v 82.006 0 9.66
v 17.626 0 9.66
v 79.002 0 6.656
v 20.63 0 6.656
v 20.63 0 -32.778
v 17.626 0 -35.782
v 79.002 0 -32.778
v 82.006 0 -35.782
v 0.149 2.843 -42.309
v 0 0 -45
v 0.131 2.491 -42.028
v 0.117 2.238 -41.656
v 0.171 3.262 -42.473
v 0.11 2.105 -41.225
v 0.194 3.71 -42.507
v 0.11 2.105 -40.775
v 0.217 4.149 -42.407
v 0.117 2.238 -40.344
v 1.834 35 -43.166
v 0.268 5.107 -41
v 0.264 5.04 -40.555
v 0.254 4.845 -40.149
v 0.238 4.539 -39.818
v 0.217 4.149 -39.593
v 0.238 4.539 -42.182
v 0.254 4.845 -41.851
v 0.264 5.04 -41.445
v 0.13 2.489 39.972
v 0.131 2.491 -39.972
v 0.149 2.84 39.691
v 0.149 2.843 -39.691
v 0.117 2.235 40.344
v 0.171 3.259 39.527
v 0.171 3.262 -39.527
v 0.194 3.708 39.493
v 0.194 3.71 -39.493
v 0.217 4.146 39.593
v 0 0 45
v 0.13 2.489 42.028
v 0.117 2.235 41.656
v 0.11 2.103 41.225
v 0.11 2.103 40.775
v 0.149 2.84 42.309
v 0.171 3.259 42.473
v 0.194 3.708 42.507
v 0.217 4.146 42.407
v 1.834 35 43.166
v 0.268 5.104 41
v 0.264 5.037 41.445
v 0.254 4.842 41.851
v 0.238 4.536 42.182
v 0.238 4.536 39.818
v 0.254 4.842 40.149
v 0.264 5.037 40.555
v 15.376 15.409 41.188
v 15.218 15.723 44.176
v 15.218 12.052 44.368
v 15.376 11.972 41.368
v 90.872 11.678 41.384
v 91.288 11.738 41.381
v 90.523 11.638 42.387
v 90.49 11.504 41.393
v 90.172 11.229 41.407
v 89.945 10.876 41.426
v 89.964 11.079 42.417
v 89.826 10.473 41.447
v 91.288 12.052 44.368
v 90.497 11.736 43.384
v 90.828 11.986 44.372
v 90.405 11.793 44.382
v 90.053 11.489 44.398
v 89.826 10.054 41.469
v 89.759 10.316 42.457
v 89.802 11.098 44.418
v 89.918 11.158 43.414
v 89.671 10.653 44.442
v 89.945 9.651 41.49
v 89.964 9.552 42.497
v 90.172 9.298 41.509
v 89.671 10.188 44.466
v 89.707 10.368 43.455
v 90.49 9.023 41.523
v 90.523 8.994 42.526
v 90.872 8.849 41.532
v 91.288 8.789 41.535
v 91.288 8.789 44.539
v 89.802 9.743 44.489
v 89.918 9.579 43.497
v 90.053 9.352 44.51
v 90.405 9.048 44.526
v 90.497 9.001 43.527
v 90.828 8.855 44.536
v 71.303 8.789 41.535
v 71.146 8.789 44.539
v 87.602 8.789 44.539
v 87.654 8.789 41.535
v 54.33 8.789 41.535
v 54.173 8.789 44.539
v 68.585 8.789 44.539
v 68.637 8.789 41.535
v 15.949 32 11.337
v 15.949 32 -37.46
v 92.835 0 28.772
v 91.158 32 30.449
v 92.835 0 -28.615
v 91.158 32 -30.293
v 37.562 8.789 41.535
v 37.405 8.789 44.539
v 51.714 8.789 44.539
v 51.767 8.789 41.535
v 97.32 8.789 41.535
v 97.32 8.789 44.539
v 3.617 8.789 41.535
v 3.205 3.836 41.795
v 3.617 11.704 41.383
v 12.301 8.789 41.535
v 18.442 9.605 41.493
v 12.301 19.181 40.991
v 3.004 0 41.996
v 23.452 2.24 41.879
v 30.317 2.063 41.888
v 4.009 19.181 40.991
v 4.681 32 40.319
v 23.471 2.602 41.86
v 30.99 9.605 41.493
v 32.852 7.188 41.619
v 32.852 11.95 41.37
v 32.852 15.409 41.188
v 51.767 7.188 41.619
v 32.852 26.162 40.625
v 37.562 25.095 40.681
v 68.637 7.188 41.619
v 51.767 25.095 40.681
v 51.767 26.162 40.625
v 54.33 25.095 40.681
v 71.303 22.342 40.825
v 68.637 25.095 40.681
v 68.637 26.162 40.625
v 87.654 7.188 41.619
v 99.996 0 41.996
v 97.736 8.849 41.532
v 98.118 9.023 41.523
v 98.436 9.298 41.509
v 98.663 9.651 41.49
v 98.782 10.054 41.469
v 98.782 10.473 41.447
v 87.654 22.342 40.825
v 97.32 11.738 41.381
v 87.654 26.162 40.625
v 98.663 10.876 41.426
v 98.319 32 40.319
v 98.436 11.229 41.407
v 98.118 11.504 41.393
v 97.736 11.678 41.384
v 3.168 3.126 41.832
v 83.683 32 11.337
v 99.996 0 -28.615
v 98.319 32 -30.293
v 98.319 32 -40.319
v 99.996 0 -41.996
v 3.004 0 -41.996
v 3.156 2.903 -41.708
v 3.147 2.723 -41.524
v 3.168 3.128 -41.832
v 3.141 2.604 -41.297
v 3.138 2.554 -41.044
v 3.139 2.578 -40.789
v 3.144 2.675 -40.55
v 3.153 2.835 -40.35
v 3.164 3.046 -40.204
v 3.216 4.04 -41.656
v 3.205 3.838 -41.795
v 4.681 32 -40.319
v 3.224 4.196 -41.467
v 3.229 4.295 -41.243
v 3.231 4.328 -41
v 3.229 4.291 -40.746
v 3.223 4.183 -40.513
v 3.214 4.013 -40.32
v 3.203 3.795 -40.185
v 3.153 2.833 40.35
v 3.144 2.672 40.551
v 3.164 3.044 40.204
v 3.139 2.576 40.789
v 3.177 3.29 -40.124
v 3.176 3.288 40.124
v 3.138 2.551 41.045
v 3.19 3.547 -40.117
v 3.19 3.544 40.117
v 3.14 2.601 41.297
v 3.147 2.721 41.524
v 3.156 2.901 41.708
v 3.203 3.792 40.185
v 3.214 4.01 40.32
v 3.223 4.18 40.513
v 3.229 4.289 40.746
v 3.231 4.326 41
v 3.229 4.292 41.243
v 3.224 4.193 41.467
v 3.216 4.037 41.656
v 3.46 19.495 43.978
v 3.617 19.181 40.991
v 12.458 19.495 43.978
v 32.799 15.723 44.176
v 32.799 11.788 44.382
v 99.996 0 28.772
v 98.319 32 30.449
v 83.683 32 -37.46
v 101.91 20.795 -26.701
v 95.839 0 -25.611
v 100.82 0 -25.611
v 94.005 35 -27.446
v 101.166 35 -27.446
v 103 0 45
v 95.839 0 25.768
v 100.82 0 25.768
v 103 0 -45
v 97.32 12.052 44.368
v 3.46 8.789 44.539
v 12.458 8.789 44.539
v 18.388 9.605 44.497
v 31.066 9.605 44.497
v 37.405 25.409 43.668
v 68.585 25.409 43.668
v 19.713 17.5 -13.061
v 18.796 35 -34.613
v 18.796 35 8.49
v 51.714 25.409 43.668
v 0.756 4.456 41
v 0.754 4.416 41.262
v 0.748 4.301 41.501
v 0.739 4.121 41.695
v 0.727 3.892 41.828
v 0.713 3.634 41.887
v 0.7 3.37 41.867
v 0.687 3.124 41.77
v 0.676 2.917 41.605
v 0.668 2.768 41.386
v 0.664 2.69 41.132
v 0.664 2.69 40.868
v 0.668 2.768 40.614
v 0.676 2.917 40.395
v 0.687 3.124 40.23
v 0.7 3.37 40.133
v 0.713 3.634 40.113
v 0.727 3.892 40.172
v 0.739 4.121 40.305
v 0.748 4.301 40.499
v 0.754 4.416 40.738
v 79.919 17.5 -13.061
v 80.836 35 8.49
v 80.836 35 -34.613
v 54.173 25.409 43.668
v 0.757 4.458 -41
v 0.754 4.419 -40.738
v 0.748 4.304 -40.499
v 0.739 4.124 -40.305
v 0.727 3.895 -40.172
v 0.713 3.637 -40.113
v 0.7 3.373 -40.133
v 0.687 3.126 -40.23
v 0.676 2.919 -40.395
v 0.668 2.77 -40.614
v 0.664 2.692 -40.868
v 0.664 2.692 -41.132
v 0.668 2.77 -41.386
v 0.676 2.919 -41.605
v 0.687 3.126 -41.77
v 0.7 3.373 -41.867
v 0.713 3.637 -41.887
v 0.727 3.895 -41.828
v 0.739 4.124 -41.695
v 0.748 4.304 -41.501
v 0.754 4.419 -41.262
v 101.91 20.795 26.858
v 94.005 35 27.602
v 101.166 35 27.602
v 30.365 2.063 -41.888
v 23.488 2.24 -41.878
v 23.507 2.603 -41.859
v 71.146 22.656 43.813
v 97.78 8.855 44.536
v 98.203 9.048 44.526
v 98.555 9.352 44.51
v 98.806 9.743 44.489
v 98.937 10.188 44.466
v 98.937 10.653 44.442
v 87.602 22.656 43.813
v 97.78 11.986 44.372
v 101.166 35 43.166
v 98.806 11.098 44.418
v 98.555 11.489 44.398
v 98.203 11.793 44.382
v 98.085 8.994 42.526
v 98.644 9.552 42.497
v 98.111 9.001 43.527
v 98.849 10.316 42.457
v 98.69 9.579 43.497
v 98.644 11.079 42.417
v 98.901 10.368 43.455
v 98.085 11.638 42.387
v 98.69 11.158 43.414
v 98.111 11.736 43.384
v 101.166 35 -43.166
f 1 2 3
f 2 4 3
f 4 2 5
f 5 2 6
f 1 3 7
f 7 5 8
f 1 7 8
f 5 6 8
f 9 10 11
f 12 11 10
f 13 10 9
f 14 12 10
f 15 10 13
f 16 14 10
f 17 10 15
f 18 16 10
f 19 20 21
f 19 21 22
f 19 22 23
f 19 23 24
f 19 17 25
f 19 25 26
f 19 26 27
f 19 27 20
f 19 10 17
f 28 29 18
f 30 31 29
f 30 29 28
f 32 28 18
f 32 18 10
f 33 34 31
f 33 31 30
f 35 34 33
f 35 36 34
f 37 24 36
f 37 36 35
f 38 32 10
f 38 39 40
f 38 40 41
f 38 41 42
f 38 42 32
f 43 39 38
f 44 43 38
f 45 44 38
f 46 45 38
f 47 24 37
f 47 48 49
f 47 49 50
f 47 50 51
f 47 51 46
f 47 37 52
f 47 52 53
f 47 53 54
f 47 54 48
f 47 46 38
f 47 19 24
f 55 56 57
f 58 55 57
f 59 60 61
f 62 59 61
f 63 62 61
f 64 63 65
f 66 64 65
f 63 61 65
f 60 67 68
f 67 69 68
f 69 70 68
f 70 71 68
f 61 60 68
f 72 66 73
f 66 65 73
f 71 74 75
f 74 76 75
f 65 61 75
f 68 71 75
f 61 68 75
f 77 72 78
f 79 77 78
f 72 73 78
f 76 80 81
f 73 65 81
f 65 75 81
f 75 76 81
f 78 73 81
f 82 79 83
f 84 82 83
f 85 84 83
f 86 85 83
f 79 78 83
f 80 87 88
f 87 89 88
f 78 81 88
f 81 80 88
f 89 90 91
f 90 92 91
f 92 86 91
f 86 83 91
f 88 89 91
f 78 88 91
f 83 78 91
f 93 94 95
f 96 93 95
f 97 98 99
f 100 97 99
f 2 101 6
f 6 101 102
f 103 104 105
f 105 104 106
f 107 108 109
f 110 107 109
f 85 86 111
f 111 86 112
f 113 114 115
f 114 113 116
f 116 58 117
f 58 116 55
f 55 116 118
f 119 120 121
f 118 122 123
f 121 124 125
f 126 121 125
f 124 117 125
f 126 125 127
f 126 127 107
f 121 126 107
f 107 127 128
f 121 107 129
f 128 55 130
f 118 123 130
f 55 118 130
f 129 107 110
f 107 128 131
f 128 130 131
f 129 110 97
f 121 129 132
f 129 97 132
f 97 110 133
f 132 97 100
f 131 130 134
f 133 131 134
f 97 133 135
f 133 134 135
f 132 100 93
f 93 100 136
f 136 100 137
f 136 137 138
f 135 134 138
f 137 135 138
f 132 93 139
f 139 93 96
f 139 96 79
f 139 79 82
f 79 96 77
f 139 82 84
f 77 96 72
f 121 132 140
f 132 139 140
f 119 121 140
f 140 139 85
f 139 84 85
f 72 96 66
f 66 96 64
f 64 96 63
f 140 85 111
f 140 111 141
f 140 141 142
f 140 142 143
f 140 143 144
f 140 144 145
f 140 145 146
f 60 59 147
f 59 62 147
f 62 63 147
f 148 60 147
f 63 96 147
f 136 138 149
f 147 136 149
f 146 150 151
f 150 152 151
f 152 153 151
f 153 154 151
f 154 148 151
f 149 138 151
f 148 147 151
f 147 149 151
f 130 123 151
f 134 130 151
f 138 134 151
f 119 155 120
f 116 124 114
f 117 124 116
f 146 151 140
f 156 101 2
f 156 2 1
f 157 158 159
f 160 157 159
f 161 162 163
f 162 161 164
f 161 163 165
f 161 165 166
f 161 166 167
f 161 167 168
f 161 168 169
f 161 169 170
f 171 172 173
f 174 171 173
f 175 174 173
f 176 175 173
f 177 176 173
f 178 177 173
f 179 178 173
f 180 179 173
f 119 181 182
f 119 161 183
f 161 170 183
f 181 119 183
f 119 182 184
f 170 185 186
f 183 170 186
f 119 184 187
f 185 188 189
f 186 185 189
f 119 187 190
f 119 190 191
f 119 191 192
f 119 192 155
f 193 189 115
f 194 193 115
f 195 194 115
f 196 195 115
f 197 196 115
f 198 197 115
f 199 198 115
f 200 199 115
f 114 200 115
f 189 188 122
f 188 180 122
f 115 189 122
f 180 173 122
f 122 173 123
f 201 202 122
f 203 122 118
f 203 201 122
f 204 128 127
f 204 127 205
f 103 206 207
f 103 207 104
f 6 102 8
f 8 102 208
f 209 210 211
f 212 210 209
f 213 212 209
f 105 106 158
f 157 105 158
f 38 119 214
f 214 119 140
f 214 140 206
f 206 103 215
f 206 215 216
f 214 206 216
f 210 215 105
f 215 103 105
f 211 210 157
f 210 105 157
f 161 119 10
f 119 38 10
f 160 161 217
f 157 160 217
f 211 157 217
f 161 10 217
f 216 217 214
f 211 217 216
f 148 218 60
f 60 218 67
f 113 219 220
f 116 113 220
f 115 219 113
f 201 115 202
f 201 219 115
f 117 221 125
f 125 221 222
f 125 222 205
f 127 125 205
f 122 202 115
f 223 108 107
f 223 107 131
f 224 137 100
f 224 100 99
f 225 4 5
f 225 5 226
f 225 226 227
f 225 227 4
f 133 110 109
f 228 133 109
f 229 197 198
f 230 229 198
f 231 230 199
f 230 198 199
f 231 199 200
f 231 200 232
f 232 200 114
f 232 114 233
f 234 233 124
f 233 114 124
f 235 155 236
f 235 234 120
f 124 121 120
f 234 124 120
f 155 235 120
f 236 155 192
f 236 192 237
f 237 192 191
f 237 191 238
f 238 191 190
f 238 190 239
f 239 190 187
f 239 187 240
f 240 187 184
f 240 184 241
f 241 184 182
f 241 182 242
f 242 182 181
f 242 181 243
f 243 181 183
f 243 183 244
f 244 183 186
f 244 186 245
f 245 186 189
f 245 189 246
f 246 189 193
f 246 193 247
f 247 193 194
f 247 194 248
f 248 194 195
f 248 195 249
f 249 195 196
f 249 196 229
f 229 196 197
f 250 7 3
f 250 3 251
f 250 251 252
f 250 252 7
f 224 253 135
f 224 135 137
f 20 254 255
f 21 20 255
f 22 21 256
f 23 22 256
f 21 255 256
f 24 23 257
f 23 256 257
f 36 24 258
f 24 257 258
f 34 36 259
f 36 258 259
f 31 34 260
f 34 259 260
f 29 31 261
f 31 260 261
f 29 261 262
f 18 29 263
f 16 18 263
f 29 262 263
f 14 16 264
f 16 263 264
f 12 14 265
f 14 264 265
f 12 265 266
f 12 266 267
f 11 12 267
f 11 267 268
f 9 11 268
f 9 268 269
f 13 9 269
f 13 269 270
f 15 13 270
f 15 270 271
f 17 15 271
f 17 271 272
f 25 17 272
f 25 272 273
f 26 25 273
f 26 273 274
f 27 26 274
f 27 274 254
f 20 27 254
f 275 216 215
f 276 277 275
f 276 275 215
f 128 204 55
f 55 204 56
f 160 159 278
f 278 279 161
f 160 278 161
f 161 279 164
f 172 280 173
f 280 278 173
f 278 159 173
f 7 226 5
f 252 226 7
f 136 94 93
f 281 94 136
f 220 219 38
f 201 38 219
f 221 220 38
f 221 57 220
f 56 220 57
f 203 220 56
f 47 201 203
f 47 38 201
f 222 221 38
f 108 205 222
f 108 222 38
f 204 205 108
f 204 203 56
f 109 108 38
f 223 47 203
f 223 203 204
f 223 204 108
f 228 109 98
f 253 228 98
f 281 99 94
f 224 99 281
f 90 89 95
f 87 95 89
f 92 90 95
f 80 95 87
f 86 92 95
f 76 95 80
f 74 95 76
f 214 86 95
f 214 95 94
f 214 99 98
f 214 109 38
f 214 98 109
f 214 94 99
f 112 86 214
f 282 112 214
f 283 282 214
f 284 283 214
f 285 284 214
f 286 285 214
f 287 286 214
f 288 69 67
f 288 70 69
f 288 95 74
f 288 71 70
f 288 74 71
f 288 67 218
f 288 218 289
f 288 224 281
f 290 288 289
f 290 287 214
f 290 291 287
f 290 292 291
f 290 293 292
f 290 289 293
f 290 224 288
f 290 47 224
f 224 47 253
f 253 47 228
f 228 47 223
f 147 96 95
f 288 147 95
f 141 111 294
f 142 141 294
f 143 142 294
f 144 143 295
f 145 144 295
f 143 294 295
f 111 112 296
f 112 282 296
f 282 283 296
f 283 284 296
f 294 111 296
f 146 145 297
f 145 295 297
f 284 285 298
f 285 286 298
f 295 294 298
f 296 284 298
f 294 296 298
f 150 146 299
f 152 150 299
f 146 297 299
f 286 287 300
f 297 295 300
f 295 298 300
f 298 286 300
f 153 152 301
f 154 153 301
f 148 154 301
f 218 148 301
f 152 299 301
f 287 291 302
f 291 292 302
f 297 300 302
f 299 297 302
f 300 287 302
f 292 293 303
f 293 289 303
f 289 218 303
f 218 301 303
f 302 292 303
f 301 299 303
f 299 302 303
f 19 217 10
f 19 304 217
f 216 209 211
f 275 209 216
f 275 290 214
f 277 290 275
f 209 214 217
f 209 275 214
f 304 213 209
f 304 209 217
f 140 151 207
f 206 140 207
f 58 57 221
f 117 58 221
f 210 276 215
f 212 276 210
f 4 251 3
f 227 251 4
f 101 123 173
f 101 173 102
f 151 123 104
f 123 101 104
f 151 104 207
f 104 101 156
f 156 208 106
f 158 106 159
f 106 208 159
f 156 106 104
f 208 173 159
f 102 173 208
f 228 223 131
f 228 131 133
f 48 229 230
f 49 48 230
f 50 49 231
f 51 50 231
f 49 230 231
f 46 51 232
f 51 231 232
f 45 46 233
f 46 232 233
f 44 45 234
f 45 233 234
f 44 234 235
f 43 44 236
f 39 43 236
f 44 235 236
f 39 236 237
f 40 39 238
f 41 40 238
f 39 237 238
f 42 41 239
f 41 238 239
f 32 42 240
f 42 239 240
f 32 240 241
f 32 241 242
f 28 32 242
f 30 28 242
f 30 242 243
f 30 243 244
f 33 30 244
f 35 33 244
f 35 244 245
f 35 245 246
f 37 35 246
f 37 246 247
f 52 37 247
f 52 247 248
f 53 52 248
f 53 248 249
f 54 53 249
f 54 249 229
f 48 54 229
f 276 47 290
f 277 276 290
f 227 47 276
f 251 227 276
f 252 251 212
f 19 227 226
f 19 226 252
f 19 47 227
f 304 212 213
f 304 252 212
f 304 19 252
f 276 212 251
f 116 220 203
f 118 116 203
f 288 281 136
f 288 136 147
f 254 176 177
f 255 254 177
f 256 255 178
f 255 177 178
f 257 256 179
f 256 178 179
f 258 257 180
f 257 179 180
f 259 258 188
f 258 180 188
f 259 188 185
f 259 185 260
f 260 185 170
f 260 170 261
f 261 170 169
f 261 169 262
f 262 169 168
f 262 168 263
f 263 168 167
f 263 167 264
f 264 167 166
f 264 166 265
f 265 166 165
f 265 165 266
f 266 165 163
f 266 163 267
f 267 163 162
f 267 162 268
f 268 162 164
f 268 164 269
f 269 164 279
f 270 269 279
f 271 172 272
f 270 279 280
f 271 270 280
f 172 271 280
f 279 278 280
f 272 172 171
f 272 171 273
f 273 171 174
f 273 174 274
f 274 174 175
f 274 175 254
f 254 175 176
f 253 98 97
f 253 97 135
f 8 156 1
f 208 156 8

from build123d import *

# Parameters (mm, degrees)
SKETCH2_W                                         = 103
SKETCH2_H                                         = 90
SKETCH2_W_2                                       = 4.981131341
SKETCH2_H_2                                       = 51.379447355
SKETCH2_W_3                                       = 58.371562284
SKETCH2_H_3                                       = 39.434223375
BOSS_EXTRUDE2_DEPTH                               = 35
BOSS_EXTRUDE2_TAPER                               = 3
SHELL2_OUTLINE_W                                  = 67.733894234
SHELL2_OUTLINE_H                                  = 48.796555325
SHELL2_DEPTH                                      = 32
SHELL2_DRAFT                                      = 3
SKETCH11_W                                        = 8.997468353
SKETCH11_H                                        = 10.72090286
CUT_EXTRUDE2_DEPTH                                = 3
CUT_EXTRUDE2_DRAFT                                = -3
SKETCH11_W_2                                      = 14.518642115
SKETCH11_H_2                                      = 16.642925392
CUT_EXTRUDE2_PROFILE_2_DEPTH                      = 3
CUT_EXTRUDE2_PROFILE_2_DRAFT                      = -3
SKETCH11_W_3                                      = 14.620886073
CUT_EXTRUDE2_PROFILE_3_DEPTH                      = 3
CUT_EXTRUDE2_PROFILE_3_DRAFT                      = -3
SKETCH11_W_4                                      = 16.665765244
SKETCH11_H_3                                      = 13.8861218
CUT_EXTRUDE2_PROFILE_4_DEPTH                      = 3
CUT_EXTRUDE2_PROFILE_4_DRAFT                      = -3
CUT_EXTRUDE2_PROFILE_5_DEPTH                      = 3
CUT_EXTRUDE2_PROFILE_5_DRAFT                      = -3
CUT_EXTRUDE2_PROFILE_6_DEPTH                      = 3
CUT_EXTRUDE2_PROFILE_6_DRAFT                      = -3
CSK_FOR_0_FLAT_HEAD_MACHINE_SCREW_100_D           = 1.778
CSK_FOR_0_FLAT_HEAD_MACHINE_SCREW_100_CSINK_D     = 3.0226
CSK_FOR_0_FLAT_HEAD_MACHINE_SCREW_100_CSINK_ANGLE = 100
CSK_FOR_0_FLAT_HEAD_MACHINE_SCREW_2_D             = 1.778
CSK_FOR_0_FLAT_HEAD_MACHINE_SCREW_2_CSINK_D       = 3.0226
CSK_FOR_0_FLAT_HEAD_MACHINE_SCREW_2_CSINK_ANGLE   = 100
DRAFT4_START                                      = 5
DRAFT4_DEPTH                                      = 19


with BuildPart() as part:
    # Sketch2 → Boss-Extrude2 (new body)
    with BuildSketch(Plane(origin=(0, 0, 0), x_dir=(1, 0, 0), z_dir=(0, 1, 0))):
        with Locations((51.5, 0)):
            Rectangle(SKETCH2_W, SKETCH2_H)
        with Locations((98.329809834, -0.07834477)):
            Rectangle(SKETCH2_W_2, SKETCH2_H_2, mode=Mode.SUBTRACT)
        with Locations((49.815754183, 13.061230018)):
            Rectangle(SKETCH2_W_3, SKETCH2_H_3, mode=Mode.SUBTRACT)
    extrude(amount=BOSS_EXTRUDE2_DEPTH, taper=BOSS_EXTRUDE2_TAPER)


with BuildPart() as shell2_tool:
    # Shell2: read off the stored shape, not the designer's step
    # Shell2 outline → Shell2 (with draft: the straight prism first)
    with BuildSketch(Plane(origin=(0, 32, 0), x_dir=(1, 0, 0), z_dir=(0, 1, 0))):
        Polygon((98.318834025, -30.449234423), (91.158078188, -30.449234423), (91.158078188, 30.292544882), (98.318834025, 30.292544882), (98.318834025, 40.318834025), (4.681165975, 40.318834025), (4.681165975, -40.318834025), (98.318834025, -40.318834025), align=None)
        with Locations((49.815754183, 13.061230019)):
            Rectangle(SHELL2_OUTLINE_W, SHELL2_OUTLINE_H, mode=Mode.SUBTRACT)
    extrude(amount=-SHELL2_DEPTH)
    # Shell2: the draft: its side faces are tilted about the plane it starts from
    shell2_sides = [shell2_tool.faces().sort_by_distance(p)[0] for p in [
        (94.738456106, 16, 30.449234423),
        (91.158078188, 16, 0.07834477),
        (94.738456107, 16, -30.292544882),
        (98.318834025, 16, -35.305689454),
        (51.5, 16, -40.318834025),
        (4.681165975, 16, 0),
        (51.5, 16, 40.318834025),
        (98.318834025, 16, 35.384034224),
        (15.948807066, 16, -13.061230018),
        (49.815754183, 16, -37.459507681),
        (83.6827013, 16, -13.061230018),
        (49.815754183, 16, 11.337047644),
    ]]
    draft(shell2_sides, Plane(origin=(0, 32, 0), x_dir=(1, 0, 0), z_dir=(0, 1, 0)), SHELL2_DRAFT)


with BuildPart() as part_1:
    add(part.part)

    # Shell2: cut by shell2_tool
    add(shell2_tool.part, mode=Mode.SUBTRACT)


with BuildPart() as cut_extrude2_tool:
    # Sketch11 → Cut-Extrude2 (with draft: the straight prism first)
    with BuildSketch(Plane(origin=(0, 2.351890424, 44.876742646), x_dir=(1, 0, 0), z_dir=(0, 0.0523359562429439, 0.998629534754574))):
        with Locations((7.959003718, 11.806398056)):
            Rectangle(SKETCH11_W, SKETCH11_H)
    extrude(amount=-CUT_EXTRUDE2_DEPTH)
    # Cut-Extrude2: the draft: its side faces are tilted about the plane it starts from
    cut_extrude2_sides = [cut_extrude2_tool.faces().sort_by_distance(p)[0] for p in [
        (3.460269541, 14.063604287, 42.760899212),
        (7.959003718, 8.710499169, 43.041443563),
        (12.457737894, 14.063604287, 42.760899212),
        (7.959003718, 19.416709405, 42.48035486),
    ]]
    draft(cut_extrude2_sides, Plane(origin=(0, 2.351890424, 44.876742646), x_dir=(1, 0, 0), z_dir=(0, 0.0523359562429439, 0.998629534754574)), CUT_EXTRUDE2_DRAFT)


with BuildPart() as part_2:
    add(part_1.part)

    # Cut-Extrude2: cut by cut_extrude2_tool
    add(cut_extrude2_tool.part, mode=Mode.SUBTRACT)


with BuildPart() as cut_extrude2_profile_2_tool:
    # Sketch11 → Cut-Extrude2 profile 2 (with draft: the straight prism first)
    with BuildSketch(Plane(origin=(0, 2.351890424, 44.876742646), x_dir=(1, 0, 0), z_dir=(0, 0.0523359562429439, 0.998629534754574))):
        with Locations((44.664584839, 14.767409322)):
            Rectangle(SKETCH11_W_2, SKETCH11_H_2)
    extrude(amount=-CUT_EXTRUDE2_PROFILE_2_DEPTH)
    # Cut-Extrude2 profile 2: the draft: its side faces are tilted about the plane it starts from
    cut_extrude2_profile_2_sides = [cut_extrude2_profile_2_tool.faces().sort_by_distance(p)[0] for p in [
        (37.405263781, 17.02055759, 42.605931856),
        (44.664584839, 8.710499169, 43.041443563),
        (51.923905896, 17.02055759, 42.605931856),
        (44.664584839, 25.330616011, 42.170420148),
    ]]
    draft(cut_extrude2_profile_2_sides, Plane(origin=(0, 2.351890424, 44.876742646), x_dir=(1, 0, 0), z_dir=(0, 0.0523359562429439, 0.998629534754574)), CUT_EXTRUDE2_PROFILE_2_DRAFT)


with BuildPart() as part_3:
    add(part_2.part)

    # Cut-Extrude2 profile 2: cut by cut_extrude2_profile_2_tool
    add(cut_extrude2_profile_2_tool.part, mode=Mode.SUBTRACT)


with BuildPart() as cut_extrude2_profile_3_tool:
    # Sketch11 → Cut-Extrude2 profile 3 (with draft: the straight prism first)
    with BuildSketch(Plane(origin=(0, 2.351890424, 44.876742646), x_dir=(1, 0, 0), z_dir=(0, 0.0523359562429439, 0.998629534754574))):
        with Locations((61.48371602, 14.767409322)):
            Rectangle(SKETCH11_W_3, SKETCH11_H_2)
    extrude(amount=-CUT_EXTRUDE2_PROFILE_3_DEPTH)
    # Cut-Extrude2 profile 3: the draft: its side faces are tilted about the plane it starts from
    cut_extrude2_profile_3_sides = [cut_extrude2_profile_3_tool.faces().sort_by_distance(p)[0] for p in [
        (54.173272984, 17.02055759, 42.605931856),
        (61.483716021, 8.710499169, 43.041443563),
        (68.794159057, 17.02055759, 42.605931856),
        (61.483716021, 25.330616011, 42.170420148),
    ]]
    draft(cut_extrude2_profile_3_sides, Plane(origin=(0, 2.351890424, 44.876742646), x_dir=(1, 0, 0), z_dir=(0, 0.0523359562429439, 0.998629534754574)), CUT_EXTRUDE2_PROFILE_3_DRAFT)


with BuildPart() as part_4:
    add(part_3.part)

    # Cut-Extrude2 profile 3: cut by cut_extrude2_profile_3_tool
    add(cut_extrude2_profile_3_tool.part, mode=Mode.SUBTRACT)


with BuildPart() as cut_extrude2_profile_4_tool:
    # Sketch11 → Cut-Extrude2 profile 4 (with draft: the straight prism first)
    with BuildSketch(Plane(origin=(0, 2.351890424, 44.876742646), x_dir=(1, 0, 0), z_dir=(0, 0.0523359562429439, 0.998629534754574))):
        with Locations((79.478652726, 13.389007526)):
            Rectangle(SKETCH11_W_4, SKETCH11_H_3)
    extrude(amount=-CUT_EXTRUDE2_PROFILE_4_DEPTH)
    # Cut-Extrude2 profile 4: the draft: its side faces are tilted about the plane it starts from
    cut_extrude2_profile_4_sides = [cut_extrude2_profile_4_tool.faces().sort_by_distance(p)[0] for p in [
        (71.145770104, 15.644044846, 42.678071832),
        (79.478652726, 8.710499169, 43.041443563),
        (87.811535348, 15.644044846, 42.678071832),
        (79.478652726, 22.577590522, 42.3147001),
    ]]
    draft(cut_extrude2_profile_4_sides, Plane(origin=(0, 2.351890424, 44.876742646), x_dir=(1, 0, 0), z_dir=(0, 0.0523359562429439, 0.998629534754574)), CUT_EXTRUDE2_PROFILE_4_DRAFT)


with BuildPart() as part_5:
    add(part_4.part)

    # Cut-Extrude2 profile 4: cut by cut_extrude2_profile_4_tool
    add(cut_extrude2_profile_4_tool.part, mode=Mode.SUBTRACT)


with BuildPart() as cut_extrude2_profile_5_tool:
    # Sketch11 → Cut-Extrude2 profile 5 (with draft: the straight prism first)
    with BuildSketch(Plane(origin=(0, 2.351890424, 44.876742646), x_dir=(1, 0, 0), z_dir=(0, 0.0523359562429439, 0.998629534754574))):
        Polygon((18.38788749, 7.26277732), (31.066138351, 7.26277732), (33.008773563, 9.713269403), (33.008773563, 13.389007526), (15.218324775, 13.389007526), (15.218324775, 9.713269403), align=None)
    extrude(amount=-CUT_EXTRUDE2_PROFILE_5_DEPTH)
    # Cut-Extrude2 profile 5: the draft: its side faces are tilted about the plane it starts from
    cut_extrude2_profile_5_sides = [cut_extrude2_profile_5_tool.faces().sort_by_distance(p)[0] for p in [
        (24.727012921, 9.526210425, 42.998693948),
        (32.037455957, 10.74977731, 42.934569524),
        (33.008773563, 13.80869452, 42.774258466),
        (24.113549169, 15.644044846, 42.678071832),
        (15.218324775, 13.80869452, 42.774258466),
        (16.803106133, 10.74977731, 42.934569524),
    ]]
    draft(cut_extrude2_profile_5_sides, Plane(origin=(0, 2.351890424, 44.876742646), x_dir=(1, 0, 0), z_dir=(0, 0.0523359562429439, 0.998629534754574)), CUT_EXTRUDE2_PROFILE_5_DRAFT)


with BuildPart() as part_6:
    add(part_5.part)

    # Cut-Extrude2 profile 5: cut by cut_extrude2_profile_5_tool
    add(cut_extrude2_profile_5_tool.part, mode=Mode.SUBTRACT)


with BuildPart() as cut_extrude2_profile_6_tool:
    # Sketch11 → Cut-Extrude2 profile 6 (with draft: the straight prism first)
    with BuildSketch(Plane(origin=(0, 2.351890424, 44.876742646), x_dir=(1, 0, 0), z_dir=(0, 0.0523359562429439, 0.998629534754574))):
        with BuildLine():
            ThreePointArc((91.287829939, 9.713269403), (89.654168551, 8.079608014), (91.287829939, 6.445946626))
            Line((91.287829939, 6.445946626), (97.320223494, 6.445946626))
            ThreePointArc((97.320223494, 6.445946626), (98.953884882, 8.079608014), (97.320223494, 9.713269403))
            Line((97.320223494, 9.713269403), (91.287829939, 9.713269403))
        make_face()
    extrude(amount=-CUT_EXTRUDE2_PROFILE_6_DEPTH)
    # Cut-Extrude2 profile 6: the draft: its side faces are tilted about the plane it starts from
    cut_extrude2_profile_6_sides = [cut_extrude2_profile_6_tool.faces().sort_by_distance(p)[0] for p in [
        (94.304026716, 11.973344194, 42.870445101),
        (89.654168551, 10.341921681, 42.955944332),
        (94.304026716, 8.710499169, 43.041443563),
        (98.953884882, 10.341921681, 42.955944332),
    ]]
    draft(cut_extrude2_profile_6_sides, Plane(origin=(0, 2.351890424, 44.876742646), x_dir=(1, 0, 0), z_dir=(0, 0.0523359562429439, 0.998629534754574)), CUT_EXTRUDE2_PROFILE_6_DRAFT)


with BuildPart() as part_7:
    add(part_6.part)

    # Cut-Extrude2 profile 6: cut by cut_extrude2_profile_6_tool
    add(cut_extrude2_profile_6_tool.part, mode=Mode.SUBTRACT)

    # CSK for _0 Flat Head Machine Screw _100 (through all)
    with Locations(Plane(origin=(0.188541787, 3.597591615, -41), x_dir=(-0.052335956243, -0.998629534755, 0), z_dir=(-0.998629534755, 0.052335956243, 0))):
        with Locations((0, 0), (0.002528755, 82)):
            CounterSinkHole(CSK_FOR_0_FLAT_HEAD_MACHINE_SCREW_100_D / 2, CSK_FOR_0_FLAT_HEAD_MACHINE_SCREW_100_CSINK_D / 2, counter_sink_angle=CSK_FOR_0_FLAT_HEAD_MACHINE_SCREW_100_CSINK_ANGLE)

    # CSK for _0 Flat Head Machine Screw _ 2 (through all)
    with Locations(Plane(origin=(0.188541787, 3.597591615, -41), x_dir=(-0.052335956243, -0.998629534755, 0), z_dir=(-0.998629534755, 0.052335956243, 0))):
        with Locations((0, 0), (0.002528755, 82)):
            CounterSinkHole(CSK_FOR_0_FLAT_HEAD_MACHINE_SCREW_2_D / 2, CSK_FOR_0_FLAT_HEAD_MACHINE_SCREW_2_CSINK_D / 2, counter_sink_angle=CSK_FOR_0_FLAT_HEAD_MACHINE_SCREW_2_CSINK_ANGLE)

    # Draft4: read off the stored shape, not the designer's step
    # Draft4 outline → Draft4 (add)
    with BuildSketch(Plane(origin=(0, 0, 0), x_dir=(1, 0, 0), z_dir=(0, 0.9986295347545739, -0.052335956242943814)).offset(DRAFT4_START)):
        Polygon((51.923905896, -44.938329064), (51.766682558, -41.938329064), (51.714317363, -44.938329064), align=None)
        Polygon((87.65431201, -41.938329064), (87.601946816, -44.938329064), (87.811535348, -44.938329064), align=None)
        Polygon((68.636935719, -41.938329064), (68.584570525, -44.938329064), (68.794159057, -44.938329064), align=None)
        Polygon((32.799185031, -44.938329064), (33.008773563, -44.938329064), (32.851550226, -41.938329064), align=None)
    extrude(amount=DRAFT4_DEPTH)


solid = part_7.part
